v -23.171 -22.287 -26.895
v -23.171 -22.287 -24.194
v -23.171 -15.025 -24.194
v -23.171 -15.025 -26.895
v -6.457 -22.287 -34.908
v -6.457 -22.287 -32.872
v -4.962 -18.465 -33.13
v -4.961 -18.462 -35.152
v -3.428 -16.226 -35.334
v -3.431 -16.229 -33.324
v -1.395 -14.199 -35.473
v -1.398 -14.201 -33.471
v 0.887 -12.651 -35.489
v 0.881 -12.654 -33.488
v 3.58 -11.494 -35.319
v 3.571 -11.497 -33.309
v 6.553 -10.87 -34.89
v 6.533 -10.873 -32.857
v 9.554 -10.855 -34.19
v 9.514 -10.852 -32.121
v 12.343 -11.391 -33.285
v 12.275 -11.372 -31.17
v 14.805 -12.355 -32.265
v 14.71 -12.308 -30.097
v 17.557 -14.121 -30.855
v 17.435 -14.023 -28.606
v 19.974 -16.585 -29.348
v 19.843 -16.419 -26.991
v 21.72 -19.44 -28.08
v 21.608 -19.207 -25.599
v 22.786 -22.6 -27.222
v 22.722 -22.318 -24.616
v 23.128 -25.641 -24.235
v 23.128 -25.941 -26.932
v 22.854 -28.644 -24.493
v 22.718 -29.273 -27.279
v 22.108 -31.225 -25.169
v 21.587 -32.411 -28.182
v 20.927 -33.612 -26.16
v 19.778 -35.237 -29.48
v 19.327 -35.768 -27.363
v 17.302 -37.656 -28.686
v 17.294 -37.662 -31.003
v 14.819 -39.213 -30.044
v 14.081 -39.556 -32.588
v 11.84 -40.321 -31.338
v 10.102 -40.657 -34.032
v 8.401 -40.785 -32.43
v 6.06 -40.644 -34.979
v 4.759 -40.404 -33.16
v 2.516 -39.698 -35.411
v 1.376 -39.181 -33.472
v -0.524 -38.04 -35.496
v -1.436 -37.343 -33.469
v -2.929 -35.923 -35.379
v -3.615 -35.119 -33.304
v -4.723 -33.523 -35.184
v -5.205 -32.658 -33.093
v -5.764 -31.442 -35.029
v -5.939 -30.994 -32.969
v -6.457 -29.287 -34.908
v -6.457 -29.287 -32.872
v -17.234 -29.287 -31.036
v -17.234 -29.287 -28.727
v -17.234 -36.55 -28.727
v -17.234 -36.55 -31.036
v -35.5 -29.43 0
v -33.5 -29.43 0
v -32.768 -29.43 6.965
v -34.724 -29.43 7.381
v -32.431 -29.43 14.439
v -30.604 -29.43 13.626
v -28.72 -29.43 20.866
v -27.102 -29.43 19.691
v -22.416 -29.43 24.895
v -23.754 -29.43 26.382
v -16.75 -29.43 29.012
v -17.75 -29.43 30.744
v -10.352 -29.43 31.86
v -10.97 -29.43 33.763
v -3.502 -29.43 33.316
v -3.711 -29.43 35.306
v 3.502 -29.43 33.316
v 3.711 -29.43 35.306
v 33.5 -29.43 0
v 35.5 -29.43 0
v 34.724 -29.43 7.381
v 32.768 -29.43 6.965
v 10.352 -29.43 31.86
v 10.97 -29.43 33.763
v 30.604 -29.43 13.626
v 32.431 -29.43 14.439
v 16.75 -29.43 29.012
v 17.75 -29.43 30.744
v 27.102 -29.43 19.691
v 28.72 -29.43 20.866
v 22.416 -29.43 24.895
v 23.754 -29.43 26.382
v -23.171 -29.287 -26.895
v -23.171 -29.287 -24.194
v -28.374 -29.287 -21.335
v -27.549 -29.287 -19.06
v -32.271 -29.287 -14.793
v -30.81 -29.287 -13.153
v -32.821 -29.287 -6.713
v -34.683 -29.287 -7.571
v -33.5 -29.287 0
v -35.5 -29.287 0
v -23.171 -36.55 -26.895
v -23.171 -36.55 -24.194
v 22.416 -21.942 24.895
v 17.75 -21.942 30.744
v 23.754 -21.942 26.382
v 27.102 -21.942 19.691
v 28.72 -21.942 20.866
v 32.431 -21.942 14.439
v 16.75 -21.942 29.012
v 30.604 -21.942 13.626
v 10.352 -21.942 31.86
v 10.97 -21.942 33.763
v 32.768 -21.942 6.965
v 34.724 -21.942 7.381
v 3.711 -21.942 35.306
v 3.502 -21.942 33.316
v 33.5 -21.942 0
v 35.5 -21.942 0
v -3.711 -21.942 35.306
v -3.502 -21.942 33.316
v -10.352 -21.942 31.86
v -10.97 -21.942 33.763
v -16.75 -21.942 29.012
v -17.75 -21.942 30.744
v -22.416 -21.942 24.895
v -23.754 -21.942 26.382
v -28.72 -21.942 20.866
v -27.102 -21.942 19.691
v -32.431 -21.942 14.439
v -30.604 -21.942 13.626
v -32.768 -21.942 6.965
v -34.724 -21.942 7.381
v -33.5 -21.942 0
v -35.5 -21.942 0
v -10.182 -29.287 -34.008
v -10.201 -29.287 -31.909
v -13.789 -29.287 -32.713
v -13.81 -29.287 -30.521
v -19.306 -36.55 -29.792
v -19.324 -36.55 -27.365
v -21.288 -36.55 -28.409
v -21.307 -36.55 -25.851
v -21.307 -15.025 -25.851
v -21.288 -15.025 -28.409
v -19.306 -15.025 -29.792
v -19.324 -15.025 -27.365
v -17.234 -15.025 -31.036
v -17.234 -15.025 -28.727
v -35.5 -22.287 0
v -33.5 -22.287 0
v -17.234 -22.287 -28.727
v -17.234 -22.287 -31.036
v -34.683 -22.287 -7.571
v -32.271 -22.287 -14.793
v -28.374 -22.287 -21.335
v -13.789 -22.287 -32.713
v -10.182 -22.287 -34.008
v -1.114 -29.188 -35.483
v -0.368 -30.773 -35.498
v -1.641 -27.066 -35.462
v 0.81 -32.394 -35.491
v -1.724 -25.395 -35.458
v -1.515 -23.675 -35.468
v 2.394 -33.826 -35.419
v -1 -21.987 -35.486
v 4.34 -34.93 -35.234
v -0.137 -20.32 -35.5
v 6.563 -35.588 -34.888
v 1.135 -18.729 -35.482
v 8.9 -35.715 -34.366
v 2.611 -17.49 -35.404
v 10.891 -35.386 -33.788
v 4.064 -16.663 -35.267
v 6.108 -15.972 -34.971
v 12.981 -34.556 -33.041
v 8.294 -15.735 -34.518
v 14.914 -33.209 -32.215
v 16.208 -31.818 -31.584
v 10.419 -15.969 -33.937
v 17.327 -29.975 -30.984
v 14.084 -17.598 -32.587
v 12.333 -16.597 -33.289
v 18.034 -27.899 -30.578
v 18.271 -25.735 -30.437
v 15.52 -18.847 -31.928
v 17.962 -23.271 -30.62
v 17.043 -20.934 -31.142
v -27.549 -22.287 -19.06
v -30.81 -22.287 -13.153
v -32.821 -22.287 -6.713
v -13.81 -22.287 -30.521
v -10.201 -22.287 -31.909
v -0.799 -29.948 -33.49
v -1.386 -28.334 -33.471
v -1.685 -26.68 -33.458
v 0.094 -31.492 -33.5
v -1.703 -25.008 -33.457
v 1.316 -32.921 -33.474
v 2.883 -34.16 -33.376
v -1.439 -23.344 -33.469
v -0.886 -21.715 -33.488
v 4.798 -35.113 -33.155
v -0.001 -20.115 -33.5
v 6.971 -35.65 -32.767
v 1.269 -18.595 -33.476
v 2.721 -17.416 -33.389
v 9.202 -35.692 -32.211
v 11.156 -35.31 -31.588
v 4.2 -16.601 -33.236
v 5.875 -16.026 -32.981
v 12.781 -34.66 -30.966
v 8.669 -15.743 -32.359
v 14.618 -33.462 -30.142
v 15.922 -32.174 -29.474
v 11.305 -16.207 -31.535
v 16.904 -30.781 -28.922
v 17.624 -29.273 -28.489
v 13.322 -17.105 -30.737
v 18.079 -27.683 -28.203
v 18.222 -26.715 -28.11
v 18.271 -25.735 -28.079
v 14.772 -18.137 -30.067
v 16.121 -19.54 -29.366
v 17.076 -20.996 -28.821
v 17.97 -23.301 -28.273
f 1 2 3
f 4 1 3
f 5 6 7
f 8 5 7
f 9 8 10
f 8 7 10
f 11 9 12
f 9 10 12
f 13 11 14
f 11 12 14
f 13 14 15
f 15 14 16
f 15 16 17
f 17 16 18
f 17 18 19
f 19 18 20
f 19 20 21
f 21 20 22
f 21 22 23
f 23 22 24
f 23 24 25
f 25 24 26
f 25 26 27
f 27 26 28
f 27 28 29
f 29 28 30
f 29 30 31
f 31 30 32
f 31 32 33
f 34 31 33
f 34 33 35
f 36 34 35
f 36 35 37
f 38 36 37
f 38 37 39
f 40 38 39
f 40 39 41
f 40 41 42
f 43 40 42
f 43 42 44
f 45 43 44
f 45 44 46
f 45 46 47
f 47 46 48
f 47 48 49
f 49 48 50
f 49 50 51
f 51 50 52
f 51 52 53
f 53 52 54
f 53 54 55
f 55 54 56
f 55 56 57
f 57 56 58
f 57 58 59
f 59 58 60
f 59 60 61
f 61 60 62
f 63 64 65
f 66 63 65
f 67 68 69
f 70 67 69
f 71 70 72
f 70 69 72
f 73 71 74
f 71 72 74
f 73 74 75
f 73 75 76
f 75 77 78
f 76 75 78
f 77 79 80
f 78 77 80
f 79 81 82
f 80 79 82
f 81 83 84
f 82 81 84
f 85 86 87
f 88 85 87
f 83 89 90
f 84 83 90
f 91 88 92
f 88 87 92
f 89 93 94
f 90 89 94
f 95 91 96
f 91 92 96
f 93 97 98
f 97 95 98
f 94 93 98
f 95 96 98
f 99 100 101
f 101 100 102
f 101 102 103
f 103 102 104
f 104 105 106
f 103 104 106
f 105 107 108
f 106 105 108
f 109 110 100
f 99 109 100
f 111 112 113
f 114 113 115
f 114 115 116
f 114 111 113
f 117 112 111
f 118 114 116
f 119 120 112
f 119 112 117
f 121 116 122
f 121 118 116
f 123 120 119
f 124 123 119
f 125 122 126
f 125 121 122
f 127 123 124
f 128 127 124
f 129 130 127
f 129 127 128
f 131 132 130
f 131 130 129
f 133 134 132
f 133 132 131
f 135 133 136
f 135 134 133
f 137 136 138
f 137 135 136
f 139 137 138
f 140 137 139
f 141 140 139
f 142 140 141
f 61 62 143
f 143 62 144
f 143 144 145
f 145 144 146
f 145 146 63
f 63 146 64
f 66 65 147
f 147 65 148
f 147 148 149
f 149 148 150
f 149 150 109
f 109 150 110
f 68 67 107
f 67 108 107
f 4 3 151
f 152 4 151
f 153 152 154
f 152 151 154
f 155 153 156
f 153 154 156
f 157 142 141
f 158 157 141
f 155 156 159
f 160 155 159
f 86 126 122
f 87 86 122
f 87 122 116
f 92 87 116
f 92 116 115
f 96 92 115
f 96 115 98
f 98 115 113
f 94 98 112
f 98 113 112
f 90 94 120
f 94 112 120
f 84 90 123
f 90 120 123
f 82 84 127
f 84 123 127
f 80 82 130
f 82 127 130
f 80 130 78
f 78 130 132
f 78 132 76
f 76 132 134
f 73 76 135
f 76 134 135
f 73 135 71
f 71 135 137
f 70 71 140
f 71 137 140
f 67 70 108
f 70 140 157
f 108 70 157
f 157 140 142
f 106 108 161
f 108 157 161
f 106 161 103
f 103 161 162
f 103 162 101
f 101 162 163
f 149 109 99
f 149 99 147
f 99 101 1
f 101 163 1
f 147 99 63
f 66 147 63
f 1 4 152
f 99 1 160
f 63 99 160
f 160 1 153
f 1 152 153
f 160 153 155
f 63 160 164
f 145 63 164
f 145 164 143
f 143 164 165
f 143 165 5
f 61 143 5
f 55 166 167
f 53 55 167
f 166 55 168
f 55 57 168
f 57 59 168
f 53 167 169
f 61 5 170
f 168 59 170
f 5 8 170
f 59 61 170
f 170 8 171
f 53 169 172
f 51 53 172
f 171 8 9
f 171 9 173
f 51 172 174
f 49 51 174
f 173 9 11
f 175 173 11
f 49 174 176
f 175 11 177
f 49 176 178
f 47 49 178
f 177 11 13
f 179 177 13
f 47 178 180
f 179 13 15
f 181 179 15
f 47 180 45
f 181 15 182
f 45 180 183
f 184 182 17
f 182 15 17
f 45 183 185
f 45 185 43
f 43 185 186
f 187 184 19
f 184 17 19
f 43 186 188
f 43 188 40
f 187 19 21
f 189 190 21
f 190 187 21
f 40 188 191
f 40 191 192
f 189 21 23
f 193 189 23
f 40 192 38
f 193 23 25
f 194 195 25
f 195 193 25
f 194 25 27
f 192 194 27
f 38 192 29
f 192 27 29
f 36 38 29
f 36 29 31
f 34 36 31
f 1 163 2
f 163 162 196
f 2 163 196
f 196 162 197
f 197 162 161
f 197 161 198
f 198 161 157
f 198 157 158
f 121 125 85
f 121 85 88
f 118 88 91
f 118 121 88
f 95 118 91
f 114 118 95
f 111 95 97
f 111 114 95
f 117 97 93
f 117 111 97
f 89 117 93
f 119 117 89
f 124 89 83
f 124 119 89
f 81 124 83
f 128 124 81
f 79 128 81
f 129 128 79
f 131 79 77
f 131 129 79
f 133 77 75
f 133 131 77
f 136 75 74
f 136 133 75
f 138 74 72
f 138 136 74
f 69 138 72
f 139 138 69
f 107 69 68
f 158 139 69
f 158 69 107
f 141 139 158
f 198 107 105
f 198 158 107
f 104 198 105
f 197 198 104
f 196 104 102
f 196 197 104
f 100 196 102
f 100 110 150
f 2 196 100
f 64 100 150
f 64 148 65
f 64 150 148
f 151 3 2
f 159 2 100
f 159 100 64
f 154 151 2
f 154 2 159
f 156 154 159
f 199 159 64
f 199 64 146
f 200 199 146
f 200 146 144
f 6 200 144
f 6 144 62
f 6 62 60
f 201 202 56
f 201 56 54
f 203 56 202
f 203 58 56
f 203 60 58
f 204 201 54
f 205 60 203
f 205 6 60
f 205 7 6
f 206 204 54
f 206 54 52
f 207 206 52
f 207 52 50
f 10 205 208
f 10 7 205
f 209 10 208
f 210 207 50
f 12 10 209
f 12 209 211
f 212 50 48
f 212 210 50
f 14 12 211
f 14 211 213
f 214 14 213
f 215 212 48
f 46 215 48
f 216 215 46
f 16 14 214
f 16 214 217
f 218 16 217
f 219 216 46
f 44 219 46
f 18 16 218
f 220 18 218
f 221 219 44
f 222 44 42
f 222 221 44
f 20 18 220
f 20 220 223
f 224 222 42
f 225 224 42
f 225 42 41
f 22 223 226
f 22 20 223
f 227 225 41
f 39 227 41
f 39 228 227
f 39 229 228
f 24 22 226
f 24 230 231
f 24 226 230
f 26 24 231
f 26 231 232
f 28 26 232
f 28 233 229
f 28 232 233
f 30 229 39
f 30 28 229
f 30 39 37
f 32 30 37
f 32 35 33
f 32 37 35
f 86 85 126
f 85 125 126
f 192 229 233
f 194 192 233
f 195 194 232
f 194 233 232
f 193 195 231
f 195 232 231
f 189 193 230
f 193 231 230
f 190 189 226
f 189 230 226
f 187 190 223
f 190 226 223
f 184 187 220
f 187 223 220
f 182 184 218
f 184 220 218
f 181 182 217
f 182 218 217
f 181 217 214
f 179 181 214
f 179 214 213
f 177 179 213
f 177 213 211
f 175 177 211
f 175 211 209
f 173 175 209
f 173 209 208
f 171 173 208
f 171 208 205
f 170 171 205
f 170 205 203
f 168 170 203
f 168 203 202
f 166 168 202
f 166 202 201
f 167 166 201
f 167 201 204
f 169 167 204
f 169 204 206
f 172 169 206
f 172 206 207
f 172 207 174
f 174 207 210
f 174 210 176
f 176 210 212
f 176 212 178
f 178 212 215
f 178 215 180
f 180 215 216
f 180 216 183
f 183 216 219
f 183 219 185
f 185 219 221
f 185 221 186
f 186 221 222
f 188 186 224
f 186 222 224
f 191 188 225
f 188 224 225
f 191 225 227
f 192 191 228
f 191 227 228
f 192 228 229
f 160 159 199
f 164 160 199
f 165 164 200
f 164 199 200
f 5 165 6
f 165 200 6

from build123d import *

# Parameters (mm, degrees)
F0_R     = 35.5
F0_R_2   = 33.5
F1_DEPTH = 50.8
F3_DEPTH = 50.8
F4_R     = 10
F5_DEPTH = 50.8
F7_DEPTH = 38.1


with BuildPart() as f1:
    # F0 (on Front) → F1 (new body)
    with BuildSketch(Plane.XZ):
        Circle(F0_R)
        Circle(F0_R_2, mode=Mode.SUBTRACT)
    extrude(amount=F1_DEPTH)

    # F2 (on Top) → F3 (cut)
    with BuildSketch(Plane.XY):
        with BuildLine():
            ThreePointArc((-6.457068, -22.28746), (23.128884, -25.78746), (-6.457068, -29.28746))
            Line((-6.457068, -29.28746), (-13.500003, -29.28746))
            Line((-13.500003, -29.28746), (-17.234227, -29.28746))
            Line((-17.234227, -29.28746), (-17.234227, -36.550397))
            Line((-17.234227, -36.550397), (-23.171365, -36.550397))
            Line((-23.171365, -36.550397), (-23.171365, -29.28746))
            Line((-23.171365, -29.28746), (-37.299089, -29.28746))
            Line((-37.299089, -29.28746), (-37.299089, -59.553057))
            Line((-37.299089, -59.553057), (42.624012, -59.553057))
            Line((42.624012, -59.553057), (42.624012, 5.546404))
            Line((42.624012, 5.546404), (-37.299089, 5.546404))
            Line((-37.299089, 5.546404), (-37.099175, -22.28746))
            Line((-37.099175, -22.28746), (-23.171365, -22.28746))
            Line((-23.171365, -22.28746), (-23.171365, -15.024522))
            Line((-23.171365, -15.024522), (-17.234227, -15.024522))
            Line((-17.234227, -15.024522), (-17.234227, -22.28746))
            Line((-17.234227, -22.28746), (-13.500003, -22.28746))
            Line((-13.500003, -22.28746), (-10.810506, -22.28746))
            Line((-10.810506, -22.28746), (-6.457068, -22.28746))
        make_face()
    extrude(amount=-F3_DEPTH, mode=Mode.SUBTRACT)

    # F4 (on Top) → F5 (cut)
    with BuildSketch(Plane.XY):
        with Locations((8.270558, -25.735088)):
            Circle(F4_R)
    extrude(amount=-F5_DEPTH, mode=Mode.SUBTRACT)

    # F6 (on Right) → F7 (cut, symmetric)
    with BuildSketch(Plane.YZ):
        Polygon((-21.942101, 38.113631), (-21.942101, 0), (-21.942101, -4.419958), (6.513468, -3.371595), (6.513468, 37.065268), align=None)
        Polygon((-29.430408, 0), (-29.430408, 39.161991), (-57.436682, 38.113631), (-57.436682, 0), align=None)
    extrude(amount=F7_DEPTH, both=True, mode=Mode.SUBTRACT)


solid = f1.part
